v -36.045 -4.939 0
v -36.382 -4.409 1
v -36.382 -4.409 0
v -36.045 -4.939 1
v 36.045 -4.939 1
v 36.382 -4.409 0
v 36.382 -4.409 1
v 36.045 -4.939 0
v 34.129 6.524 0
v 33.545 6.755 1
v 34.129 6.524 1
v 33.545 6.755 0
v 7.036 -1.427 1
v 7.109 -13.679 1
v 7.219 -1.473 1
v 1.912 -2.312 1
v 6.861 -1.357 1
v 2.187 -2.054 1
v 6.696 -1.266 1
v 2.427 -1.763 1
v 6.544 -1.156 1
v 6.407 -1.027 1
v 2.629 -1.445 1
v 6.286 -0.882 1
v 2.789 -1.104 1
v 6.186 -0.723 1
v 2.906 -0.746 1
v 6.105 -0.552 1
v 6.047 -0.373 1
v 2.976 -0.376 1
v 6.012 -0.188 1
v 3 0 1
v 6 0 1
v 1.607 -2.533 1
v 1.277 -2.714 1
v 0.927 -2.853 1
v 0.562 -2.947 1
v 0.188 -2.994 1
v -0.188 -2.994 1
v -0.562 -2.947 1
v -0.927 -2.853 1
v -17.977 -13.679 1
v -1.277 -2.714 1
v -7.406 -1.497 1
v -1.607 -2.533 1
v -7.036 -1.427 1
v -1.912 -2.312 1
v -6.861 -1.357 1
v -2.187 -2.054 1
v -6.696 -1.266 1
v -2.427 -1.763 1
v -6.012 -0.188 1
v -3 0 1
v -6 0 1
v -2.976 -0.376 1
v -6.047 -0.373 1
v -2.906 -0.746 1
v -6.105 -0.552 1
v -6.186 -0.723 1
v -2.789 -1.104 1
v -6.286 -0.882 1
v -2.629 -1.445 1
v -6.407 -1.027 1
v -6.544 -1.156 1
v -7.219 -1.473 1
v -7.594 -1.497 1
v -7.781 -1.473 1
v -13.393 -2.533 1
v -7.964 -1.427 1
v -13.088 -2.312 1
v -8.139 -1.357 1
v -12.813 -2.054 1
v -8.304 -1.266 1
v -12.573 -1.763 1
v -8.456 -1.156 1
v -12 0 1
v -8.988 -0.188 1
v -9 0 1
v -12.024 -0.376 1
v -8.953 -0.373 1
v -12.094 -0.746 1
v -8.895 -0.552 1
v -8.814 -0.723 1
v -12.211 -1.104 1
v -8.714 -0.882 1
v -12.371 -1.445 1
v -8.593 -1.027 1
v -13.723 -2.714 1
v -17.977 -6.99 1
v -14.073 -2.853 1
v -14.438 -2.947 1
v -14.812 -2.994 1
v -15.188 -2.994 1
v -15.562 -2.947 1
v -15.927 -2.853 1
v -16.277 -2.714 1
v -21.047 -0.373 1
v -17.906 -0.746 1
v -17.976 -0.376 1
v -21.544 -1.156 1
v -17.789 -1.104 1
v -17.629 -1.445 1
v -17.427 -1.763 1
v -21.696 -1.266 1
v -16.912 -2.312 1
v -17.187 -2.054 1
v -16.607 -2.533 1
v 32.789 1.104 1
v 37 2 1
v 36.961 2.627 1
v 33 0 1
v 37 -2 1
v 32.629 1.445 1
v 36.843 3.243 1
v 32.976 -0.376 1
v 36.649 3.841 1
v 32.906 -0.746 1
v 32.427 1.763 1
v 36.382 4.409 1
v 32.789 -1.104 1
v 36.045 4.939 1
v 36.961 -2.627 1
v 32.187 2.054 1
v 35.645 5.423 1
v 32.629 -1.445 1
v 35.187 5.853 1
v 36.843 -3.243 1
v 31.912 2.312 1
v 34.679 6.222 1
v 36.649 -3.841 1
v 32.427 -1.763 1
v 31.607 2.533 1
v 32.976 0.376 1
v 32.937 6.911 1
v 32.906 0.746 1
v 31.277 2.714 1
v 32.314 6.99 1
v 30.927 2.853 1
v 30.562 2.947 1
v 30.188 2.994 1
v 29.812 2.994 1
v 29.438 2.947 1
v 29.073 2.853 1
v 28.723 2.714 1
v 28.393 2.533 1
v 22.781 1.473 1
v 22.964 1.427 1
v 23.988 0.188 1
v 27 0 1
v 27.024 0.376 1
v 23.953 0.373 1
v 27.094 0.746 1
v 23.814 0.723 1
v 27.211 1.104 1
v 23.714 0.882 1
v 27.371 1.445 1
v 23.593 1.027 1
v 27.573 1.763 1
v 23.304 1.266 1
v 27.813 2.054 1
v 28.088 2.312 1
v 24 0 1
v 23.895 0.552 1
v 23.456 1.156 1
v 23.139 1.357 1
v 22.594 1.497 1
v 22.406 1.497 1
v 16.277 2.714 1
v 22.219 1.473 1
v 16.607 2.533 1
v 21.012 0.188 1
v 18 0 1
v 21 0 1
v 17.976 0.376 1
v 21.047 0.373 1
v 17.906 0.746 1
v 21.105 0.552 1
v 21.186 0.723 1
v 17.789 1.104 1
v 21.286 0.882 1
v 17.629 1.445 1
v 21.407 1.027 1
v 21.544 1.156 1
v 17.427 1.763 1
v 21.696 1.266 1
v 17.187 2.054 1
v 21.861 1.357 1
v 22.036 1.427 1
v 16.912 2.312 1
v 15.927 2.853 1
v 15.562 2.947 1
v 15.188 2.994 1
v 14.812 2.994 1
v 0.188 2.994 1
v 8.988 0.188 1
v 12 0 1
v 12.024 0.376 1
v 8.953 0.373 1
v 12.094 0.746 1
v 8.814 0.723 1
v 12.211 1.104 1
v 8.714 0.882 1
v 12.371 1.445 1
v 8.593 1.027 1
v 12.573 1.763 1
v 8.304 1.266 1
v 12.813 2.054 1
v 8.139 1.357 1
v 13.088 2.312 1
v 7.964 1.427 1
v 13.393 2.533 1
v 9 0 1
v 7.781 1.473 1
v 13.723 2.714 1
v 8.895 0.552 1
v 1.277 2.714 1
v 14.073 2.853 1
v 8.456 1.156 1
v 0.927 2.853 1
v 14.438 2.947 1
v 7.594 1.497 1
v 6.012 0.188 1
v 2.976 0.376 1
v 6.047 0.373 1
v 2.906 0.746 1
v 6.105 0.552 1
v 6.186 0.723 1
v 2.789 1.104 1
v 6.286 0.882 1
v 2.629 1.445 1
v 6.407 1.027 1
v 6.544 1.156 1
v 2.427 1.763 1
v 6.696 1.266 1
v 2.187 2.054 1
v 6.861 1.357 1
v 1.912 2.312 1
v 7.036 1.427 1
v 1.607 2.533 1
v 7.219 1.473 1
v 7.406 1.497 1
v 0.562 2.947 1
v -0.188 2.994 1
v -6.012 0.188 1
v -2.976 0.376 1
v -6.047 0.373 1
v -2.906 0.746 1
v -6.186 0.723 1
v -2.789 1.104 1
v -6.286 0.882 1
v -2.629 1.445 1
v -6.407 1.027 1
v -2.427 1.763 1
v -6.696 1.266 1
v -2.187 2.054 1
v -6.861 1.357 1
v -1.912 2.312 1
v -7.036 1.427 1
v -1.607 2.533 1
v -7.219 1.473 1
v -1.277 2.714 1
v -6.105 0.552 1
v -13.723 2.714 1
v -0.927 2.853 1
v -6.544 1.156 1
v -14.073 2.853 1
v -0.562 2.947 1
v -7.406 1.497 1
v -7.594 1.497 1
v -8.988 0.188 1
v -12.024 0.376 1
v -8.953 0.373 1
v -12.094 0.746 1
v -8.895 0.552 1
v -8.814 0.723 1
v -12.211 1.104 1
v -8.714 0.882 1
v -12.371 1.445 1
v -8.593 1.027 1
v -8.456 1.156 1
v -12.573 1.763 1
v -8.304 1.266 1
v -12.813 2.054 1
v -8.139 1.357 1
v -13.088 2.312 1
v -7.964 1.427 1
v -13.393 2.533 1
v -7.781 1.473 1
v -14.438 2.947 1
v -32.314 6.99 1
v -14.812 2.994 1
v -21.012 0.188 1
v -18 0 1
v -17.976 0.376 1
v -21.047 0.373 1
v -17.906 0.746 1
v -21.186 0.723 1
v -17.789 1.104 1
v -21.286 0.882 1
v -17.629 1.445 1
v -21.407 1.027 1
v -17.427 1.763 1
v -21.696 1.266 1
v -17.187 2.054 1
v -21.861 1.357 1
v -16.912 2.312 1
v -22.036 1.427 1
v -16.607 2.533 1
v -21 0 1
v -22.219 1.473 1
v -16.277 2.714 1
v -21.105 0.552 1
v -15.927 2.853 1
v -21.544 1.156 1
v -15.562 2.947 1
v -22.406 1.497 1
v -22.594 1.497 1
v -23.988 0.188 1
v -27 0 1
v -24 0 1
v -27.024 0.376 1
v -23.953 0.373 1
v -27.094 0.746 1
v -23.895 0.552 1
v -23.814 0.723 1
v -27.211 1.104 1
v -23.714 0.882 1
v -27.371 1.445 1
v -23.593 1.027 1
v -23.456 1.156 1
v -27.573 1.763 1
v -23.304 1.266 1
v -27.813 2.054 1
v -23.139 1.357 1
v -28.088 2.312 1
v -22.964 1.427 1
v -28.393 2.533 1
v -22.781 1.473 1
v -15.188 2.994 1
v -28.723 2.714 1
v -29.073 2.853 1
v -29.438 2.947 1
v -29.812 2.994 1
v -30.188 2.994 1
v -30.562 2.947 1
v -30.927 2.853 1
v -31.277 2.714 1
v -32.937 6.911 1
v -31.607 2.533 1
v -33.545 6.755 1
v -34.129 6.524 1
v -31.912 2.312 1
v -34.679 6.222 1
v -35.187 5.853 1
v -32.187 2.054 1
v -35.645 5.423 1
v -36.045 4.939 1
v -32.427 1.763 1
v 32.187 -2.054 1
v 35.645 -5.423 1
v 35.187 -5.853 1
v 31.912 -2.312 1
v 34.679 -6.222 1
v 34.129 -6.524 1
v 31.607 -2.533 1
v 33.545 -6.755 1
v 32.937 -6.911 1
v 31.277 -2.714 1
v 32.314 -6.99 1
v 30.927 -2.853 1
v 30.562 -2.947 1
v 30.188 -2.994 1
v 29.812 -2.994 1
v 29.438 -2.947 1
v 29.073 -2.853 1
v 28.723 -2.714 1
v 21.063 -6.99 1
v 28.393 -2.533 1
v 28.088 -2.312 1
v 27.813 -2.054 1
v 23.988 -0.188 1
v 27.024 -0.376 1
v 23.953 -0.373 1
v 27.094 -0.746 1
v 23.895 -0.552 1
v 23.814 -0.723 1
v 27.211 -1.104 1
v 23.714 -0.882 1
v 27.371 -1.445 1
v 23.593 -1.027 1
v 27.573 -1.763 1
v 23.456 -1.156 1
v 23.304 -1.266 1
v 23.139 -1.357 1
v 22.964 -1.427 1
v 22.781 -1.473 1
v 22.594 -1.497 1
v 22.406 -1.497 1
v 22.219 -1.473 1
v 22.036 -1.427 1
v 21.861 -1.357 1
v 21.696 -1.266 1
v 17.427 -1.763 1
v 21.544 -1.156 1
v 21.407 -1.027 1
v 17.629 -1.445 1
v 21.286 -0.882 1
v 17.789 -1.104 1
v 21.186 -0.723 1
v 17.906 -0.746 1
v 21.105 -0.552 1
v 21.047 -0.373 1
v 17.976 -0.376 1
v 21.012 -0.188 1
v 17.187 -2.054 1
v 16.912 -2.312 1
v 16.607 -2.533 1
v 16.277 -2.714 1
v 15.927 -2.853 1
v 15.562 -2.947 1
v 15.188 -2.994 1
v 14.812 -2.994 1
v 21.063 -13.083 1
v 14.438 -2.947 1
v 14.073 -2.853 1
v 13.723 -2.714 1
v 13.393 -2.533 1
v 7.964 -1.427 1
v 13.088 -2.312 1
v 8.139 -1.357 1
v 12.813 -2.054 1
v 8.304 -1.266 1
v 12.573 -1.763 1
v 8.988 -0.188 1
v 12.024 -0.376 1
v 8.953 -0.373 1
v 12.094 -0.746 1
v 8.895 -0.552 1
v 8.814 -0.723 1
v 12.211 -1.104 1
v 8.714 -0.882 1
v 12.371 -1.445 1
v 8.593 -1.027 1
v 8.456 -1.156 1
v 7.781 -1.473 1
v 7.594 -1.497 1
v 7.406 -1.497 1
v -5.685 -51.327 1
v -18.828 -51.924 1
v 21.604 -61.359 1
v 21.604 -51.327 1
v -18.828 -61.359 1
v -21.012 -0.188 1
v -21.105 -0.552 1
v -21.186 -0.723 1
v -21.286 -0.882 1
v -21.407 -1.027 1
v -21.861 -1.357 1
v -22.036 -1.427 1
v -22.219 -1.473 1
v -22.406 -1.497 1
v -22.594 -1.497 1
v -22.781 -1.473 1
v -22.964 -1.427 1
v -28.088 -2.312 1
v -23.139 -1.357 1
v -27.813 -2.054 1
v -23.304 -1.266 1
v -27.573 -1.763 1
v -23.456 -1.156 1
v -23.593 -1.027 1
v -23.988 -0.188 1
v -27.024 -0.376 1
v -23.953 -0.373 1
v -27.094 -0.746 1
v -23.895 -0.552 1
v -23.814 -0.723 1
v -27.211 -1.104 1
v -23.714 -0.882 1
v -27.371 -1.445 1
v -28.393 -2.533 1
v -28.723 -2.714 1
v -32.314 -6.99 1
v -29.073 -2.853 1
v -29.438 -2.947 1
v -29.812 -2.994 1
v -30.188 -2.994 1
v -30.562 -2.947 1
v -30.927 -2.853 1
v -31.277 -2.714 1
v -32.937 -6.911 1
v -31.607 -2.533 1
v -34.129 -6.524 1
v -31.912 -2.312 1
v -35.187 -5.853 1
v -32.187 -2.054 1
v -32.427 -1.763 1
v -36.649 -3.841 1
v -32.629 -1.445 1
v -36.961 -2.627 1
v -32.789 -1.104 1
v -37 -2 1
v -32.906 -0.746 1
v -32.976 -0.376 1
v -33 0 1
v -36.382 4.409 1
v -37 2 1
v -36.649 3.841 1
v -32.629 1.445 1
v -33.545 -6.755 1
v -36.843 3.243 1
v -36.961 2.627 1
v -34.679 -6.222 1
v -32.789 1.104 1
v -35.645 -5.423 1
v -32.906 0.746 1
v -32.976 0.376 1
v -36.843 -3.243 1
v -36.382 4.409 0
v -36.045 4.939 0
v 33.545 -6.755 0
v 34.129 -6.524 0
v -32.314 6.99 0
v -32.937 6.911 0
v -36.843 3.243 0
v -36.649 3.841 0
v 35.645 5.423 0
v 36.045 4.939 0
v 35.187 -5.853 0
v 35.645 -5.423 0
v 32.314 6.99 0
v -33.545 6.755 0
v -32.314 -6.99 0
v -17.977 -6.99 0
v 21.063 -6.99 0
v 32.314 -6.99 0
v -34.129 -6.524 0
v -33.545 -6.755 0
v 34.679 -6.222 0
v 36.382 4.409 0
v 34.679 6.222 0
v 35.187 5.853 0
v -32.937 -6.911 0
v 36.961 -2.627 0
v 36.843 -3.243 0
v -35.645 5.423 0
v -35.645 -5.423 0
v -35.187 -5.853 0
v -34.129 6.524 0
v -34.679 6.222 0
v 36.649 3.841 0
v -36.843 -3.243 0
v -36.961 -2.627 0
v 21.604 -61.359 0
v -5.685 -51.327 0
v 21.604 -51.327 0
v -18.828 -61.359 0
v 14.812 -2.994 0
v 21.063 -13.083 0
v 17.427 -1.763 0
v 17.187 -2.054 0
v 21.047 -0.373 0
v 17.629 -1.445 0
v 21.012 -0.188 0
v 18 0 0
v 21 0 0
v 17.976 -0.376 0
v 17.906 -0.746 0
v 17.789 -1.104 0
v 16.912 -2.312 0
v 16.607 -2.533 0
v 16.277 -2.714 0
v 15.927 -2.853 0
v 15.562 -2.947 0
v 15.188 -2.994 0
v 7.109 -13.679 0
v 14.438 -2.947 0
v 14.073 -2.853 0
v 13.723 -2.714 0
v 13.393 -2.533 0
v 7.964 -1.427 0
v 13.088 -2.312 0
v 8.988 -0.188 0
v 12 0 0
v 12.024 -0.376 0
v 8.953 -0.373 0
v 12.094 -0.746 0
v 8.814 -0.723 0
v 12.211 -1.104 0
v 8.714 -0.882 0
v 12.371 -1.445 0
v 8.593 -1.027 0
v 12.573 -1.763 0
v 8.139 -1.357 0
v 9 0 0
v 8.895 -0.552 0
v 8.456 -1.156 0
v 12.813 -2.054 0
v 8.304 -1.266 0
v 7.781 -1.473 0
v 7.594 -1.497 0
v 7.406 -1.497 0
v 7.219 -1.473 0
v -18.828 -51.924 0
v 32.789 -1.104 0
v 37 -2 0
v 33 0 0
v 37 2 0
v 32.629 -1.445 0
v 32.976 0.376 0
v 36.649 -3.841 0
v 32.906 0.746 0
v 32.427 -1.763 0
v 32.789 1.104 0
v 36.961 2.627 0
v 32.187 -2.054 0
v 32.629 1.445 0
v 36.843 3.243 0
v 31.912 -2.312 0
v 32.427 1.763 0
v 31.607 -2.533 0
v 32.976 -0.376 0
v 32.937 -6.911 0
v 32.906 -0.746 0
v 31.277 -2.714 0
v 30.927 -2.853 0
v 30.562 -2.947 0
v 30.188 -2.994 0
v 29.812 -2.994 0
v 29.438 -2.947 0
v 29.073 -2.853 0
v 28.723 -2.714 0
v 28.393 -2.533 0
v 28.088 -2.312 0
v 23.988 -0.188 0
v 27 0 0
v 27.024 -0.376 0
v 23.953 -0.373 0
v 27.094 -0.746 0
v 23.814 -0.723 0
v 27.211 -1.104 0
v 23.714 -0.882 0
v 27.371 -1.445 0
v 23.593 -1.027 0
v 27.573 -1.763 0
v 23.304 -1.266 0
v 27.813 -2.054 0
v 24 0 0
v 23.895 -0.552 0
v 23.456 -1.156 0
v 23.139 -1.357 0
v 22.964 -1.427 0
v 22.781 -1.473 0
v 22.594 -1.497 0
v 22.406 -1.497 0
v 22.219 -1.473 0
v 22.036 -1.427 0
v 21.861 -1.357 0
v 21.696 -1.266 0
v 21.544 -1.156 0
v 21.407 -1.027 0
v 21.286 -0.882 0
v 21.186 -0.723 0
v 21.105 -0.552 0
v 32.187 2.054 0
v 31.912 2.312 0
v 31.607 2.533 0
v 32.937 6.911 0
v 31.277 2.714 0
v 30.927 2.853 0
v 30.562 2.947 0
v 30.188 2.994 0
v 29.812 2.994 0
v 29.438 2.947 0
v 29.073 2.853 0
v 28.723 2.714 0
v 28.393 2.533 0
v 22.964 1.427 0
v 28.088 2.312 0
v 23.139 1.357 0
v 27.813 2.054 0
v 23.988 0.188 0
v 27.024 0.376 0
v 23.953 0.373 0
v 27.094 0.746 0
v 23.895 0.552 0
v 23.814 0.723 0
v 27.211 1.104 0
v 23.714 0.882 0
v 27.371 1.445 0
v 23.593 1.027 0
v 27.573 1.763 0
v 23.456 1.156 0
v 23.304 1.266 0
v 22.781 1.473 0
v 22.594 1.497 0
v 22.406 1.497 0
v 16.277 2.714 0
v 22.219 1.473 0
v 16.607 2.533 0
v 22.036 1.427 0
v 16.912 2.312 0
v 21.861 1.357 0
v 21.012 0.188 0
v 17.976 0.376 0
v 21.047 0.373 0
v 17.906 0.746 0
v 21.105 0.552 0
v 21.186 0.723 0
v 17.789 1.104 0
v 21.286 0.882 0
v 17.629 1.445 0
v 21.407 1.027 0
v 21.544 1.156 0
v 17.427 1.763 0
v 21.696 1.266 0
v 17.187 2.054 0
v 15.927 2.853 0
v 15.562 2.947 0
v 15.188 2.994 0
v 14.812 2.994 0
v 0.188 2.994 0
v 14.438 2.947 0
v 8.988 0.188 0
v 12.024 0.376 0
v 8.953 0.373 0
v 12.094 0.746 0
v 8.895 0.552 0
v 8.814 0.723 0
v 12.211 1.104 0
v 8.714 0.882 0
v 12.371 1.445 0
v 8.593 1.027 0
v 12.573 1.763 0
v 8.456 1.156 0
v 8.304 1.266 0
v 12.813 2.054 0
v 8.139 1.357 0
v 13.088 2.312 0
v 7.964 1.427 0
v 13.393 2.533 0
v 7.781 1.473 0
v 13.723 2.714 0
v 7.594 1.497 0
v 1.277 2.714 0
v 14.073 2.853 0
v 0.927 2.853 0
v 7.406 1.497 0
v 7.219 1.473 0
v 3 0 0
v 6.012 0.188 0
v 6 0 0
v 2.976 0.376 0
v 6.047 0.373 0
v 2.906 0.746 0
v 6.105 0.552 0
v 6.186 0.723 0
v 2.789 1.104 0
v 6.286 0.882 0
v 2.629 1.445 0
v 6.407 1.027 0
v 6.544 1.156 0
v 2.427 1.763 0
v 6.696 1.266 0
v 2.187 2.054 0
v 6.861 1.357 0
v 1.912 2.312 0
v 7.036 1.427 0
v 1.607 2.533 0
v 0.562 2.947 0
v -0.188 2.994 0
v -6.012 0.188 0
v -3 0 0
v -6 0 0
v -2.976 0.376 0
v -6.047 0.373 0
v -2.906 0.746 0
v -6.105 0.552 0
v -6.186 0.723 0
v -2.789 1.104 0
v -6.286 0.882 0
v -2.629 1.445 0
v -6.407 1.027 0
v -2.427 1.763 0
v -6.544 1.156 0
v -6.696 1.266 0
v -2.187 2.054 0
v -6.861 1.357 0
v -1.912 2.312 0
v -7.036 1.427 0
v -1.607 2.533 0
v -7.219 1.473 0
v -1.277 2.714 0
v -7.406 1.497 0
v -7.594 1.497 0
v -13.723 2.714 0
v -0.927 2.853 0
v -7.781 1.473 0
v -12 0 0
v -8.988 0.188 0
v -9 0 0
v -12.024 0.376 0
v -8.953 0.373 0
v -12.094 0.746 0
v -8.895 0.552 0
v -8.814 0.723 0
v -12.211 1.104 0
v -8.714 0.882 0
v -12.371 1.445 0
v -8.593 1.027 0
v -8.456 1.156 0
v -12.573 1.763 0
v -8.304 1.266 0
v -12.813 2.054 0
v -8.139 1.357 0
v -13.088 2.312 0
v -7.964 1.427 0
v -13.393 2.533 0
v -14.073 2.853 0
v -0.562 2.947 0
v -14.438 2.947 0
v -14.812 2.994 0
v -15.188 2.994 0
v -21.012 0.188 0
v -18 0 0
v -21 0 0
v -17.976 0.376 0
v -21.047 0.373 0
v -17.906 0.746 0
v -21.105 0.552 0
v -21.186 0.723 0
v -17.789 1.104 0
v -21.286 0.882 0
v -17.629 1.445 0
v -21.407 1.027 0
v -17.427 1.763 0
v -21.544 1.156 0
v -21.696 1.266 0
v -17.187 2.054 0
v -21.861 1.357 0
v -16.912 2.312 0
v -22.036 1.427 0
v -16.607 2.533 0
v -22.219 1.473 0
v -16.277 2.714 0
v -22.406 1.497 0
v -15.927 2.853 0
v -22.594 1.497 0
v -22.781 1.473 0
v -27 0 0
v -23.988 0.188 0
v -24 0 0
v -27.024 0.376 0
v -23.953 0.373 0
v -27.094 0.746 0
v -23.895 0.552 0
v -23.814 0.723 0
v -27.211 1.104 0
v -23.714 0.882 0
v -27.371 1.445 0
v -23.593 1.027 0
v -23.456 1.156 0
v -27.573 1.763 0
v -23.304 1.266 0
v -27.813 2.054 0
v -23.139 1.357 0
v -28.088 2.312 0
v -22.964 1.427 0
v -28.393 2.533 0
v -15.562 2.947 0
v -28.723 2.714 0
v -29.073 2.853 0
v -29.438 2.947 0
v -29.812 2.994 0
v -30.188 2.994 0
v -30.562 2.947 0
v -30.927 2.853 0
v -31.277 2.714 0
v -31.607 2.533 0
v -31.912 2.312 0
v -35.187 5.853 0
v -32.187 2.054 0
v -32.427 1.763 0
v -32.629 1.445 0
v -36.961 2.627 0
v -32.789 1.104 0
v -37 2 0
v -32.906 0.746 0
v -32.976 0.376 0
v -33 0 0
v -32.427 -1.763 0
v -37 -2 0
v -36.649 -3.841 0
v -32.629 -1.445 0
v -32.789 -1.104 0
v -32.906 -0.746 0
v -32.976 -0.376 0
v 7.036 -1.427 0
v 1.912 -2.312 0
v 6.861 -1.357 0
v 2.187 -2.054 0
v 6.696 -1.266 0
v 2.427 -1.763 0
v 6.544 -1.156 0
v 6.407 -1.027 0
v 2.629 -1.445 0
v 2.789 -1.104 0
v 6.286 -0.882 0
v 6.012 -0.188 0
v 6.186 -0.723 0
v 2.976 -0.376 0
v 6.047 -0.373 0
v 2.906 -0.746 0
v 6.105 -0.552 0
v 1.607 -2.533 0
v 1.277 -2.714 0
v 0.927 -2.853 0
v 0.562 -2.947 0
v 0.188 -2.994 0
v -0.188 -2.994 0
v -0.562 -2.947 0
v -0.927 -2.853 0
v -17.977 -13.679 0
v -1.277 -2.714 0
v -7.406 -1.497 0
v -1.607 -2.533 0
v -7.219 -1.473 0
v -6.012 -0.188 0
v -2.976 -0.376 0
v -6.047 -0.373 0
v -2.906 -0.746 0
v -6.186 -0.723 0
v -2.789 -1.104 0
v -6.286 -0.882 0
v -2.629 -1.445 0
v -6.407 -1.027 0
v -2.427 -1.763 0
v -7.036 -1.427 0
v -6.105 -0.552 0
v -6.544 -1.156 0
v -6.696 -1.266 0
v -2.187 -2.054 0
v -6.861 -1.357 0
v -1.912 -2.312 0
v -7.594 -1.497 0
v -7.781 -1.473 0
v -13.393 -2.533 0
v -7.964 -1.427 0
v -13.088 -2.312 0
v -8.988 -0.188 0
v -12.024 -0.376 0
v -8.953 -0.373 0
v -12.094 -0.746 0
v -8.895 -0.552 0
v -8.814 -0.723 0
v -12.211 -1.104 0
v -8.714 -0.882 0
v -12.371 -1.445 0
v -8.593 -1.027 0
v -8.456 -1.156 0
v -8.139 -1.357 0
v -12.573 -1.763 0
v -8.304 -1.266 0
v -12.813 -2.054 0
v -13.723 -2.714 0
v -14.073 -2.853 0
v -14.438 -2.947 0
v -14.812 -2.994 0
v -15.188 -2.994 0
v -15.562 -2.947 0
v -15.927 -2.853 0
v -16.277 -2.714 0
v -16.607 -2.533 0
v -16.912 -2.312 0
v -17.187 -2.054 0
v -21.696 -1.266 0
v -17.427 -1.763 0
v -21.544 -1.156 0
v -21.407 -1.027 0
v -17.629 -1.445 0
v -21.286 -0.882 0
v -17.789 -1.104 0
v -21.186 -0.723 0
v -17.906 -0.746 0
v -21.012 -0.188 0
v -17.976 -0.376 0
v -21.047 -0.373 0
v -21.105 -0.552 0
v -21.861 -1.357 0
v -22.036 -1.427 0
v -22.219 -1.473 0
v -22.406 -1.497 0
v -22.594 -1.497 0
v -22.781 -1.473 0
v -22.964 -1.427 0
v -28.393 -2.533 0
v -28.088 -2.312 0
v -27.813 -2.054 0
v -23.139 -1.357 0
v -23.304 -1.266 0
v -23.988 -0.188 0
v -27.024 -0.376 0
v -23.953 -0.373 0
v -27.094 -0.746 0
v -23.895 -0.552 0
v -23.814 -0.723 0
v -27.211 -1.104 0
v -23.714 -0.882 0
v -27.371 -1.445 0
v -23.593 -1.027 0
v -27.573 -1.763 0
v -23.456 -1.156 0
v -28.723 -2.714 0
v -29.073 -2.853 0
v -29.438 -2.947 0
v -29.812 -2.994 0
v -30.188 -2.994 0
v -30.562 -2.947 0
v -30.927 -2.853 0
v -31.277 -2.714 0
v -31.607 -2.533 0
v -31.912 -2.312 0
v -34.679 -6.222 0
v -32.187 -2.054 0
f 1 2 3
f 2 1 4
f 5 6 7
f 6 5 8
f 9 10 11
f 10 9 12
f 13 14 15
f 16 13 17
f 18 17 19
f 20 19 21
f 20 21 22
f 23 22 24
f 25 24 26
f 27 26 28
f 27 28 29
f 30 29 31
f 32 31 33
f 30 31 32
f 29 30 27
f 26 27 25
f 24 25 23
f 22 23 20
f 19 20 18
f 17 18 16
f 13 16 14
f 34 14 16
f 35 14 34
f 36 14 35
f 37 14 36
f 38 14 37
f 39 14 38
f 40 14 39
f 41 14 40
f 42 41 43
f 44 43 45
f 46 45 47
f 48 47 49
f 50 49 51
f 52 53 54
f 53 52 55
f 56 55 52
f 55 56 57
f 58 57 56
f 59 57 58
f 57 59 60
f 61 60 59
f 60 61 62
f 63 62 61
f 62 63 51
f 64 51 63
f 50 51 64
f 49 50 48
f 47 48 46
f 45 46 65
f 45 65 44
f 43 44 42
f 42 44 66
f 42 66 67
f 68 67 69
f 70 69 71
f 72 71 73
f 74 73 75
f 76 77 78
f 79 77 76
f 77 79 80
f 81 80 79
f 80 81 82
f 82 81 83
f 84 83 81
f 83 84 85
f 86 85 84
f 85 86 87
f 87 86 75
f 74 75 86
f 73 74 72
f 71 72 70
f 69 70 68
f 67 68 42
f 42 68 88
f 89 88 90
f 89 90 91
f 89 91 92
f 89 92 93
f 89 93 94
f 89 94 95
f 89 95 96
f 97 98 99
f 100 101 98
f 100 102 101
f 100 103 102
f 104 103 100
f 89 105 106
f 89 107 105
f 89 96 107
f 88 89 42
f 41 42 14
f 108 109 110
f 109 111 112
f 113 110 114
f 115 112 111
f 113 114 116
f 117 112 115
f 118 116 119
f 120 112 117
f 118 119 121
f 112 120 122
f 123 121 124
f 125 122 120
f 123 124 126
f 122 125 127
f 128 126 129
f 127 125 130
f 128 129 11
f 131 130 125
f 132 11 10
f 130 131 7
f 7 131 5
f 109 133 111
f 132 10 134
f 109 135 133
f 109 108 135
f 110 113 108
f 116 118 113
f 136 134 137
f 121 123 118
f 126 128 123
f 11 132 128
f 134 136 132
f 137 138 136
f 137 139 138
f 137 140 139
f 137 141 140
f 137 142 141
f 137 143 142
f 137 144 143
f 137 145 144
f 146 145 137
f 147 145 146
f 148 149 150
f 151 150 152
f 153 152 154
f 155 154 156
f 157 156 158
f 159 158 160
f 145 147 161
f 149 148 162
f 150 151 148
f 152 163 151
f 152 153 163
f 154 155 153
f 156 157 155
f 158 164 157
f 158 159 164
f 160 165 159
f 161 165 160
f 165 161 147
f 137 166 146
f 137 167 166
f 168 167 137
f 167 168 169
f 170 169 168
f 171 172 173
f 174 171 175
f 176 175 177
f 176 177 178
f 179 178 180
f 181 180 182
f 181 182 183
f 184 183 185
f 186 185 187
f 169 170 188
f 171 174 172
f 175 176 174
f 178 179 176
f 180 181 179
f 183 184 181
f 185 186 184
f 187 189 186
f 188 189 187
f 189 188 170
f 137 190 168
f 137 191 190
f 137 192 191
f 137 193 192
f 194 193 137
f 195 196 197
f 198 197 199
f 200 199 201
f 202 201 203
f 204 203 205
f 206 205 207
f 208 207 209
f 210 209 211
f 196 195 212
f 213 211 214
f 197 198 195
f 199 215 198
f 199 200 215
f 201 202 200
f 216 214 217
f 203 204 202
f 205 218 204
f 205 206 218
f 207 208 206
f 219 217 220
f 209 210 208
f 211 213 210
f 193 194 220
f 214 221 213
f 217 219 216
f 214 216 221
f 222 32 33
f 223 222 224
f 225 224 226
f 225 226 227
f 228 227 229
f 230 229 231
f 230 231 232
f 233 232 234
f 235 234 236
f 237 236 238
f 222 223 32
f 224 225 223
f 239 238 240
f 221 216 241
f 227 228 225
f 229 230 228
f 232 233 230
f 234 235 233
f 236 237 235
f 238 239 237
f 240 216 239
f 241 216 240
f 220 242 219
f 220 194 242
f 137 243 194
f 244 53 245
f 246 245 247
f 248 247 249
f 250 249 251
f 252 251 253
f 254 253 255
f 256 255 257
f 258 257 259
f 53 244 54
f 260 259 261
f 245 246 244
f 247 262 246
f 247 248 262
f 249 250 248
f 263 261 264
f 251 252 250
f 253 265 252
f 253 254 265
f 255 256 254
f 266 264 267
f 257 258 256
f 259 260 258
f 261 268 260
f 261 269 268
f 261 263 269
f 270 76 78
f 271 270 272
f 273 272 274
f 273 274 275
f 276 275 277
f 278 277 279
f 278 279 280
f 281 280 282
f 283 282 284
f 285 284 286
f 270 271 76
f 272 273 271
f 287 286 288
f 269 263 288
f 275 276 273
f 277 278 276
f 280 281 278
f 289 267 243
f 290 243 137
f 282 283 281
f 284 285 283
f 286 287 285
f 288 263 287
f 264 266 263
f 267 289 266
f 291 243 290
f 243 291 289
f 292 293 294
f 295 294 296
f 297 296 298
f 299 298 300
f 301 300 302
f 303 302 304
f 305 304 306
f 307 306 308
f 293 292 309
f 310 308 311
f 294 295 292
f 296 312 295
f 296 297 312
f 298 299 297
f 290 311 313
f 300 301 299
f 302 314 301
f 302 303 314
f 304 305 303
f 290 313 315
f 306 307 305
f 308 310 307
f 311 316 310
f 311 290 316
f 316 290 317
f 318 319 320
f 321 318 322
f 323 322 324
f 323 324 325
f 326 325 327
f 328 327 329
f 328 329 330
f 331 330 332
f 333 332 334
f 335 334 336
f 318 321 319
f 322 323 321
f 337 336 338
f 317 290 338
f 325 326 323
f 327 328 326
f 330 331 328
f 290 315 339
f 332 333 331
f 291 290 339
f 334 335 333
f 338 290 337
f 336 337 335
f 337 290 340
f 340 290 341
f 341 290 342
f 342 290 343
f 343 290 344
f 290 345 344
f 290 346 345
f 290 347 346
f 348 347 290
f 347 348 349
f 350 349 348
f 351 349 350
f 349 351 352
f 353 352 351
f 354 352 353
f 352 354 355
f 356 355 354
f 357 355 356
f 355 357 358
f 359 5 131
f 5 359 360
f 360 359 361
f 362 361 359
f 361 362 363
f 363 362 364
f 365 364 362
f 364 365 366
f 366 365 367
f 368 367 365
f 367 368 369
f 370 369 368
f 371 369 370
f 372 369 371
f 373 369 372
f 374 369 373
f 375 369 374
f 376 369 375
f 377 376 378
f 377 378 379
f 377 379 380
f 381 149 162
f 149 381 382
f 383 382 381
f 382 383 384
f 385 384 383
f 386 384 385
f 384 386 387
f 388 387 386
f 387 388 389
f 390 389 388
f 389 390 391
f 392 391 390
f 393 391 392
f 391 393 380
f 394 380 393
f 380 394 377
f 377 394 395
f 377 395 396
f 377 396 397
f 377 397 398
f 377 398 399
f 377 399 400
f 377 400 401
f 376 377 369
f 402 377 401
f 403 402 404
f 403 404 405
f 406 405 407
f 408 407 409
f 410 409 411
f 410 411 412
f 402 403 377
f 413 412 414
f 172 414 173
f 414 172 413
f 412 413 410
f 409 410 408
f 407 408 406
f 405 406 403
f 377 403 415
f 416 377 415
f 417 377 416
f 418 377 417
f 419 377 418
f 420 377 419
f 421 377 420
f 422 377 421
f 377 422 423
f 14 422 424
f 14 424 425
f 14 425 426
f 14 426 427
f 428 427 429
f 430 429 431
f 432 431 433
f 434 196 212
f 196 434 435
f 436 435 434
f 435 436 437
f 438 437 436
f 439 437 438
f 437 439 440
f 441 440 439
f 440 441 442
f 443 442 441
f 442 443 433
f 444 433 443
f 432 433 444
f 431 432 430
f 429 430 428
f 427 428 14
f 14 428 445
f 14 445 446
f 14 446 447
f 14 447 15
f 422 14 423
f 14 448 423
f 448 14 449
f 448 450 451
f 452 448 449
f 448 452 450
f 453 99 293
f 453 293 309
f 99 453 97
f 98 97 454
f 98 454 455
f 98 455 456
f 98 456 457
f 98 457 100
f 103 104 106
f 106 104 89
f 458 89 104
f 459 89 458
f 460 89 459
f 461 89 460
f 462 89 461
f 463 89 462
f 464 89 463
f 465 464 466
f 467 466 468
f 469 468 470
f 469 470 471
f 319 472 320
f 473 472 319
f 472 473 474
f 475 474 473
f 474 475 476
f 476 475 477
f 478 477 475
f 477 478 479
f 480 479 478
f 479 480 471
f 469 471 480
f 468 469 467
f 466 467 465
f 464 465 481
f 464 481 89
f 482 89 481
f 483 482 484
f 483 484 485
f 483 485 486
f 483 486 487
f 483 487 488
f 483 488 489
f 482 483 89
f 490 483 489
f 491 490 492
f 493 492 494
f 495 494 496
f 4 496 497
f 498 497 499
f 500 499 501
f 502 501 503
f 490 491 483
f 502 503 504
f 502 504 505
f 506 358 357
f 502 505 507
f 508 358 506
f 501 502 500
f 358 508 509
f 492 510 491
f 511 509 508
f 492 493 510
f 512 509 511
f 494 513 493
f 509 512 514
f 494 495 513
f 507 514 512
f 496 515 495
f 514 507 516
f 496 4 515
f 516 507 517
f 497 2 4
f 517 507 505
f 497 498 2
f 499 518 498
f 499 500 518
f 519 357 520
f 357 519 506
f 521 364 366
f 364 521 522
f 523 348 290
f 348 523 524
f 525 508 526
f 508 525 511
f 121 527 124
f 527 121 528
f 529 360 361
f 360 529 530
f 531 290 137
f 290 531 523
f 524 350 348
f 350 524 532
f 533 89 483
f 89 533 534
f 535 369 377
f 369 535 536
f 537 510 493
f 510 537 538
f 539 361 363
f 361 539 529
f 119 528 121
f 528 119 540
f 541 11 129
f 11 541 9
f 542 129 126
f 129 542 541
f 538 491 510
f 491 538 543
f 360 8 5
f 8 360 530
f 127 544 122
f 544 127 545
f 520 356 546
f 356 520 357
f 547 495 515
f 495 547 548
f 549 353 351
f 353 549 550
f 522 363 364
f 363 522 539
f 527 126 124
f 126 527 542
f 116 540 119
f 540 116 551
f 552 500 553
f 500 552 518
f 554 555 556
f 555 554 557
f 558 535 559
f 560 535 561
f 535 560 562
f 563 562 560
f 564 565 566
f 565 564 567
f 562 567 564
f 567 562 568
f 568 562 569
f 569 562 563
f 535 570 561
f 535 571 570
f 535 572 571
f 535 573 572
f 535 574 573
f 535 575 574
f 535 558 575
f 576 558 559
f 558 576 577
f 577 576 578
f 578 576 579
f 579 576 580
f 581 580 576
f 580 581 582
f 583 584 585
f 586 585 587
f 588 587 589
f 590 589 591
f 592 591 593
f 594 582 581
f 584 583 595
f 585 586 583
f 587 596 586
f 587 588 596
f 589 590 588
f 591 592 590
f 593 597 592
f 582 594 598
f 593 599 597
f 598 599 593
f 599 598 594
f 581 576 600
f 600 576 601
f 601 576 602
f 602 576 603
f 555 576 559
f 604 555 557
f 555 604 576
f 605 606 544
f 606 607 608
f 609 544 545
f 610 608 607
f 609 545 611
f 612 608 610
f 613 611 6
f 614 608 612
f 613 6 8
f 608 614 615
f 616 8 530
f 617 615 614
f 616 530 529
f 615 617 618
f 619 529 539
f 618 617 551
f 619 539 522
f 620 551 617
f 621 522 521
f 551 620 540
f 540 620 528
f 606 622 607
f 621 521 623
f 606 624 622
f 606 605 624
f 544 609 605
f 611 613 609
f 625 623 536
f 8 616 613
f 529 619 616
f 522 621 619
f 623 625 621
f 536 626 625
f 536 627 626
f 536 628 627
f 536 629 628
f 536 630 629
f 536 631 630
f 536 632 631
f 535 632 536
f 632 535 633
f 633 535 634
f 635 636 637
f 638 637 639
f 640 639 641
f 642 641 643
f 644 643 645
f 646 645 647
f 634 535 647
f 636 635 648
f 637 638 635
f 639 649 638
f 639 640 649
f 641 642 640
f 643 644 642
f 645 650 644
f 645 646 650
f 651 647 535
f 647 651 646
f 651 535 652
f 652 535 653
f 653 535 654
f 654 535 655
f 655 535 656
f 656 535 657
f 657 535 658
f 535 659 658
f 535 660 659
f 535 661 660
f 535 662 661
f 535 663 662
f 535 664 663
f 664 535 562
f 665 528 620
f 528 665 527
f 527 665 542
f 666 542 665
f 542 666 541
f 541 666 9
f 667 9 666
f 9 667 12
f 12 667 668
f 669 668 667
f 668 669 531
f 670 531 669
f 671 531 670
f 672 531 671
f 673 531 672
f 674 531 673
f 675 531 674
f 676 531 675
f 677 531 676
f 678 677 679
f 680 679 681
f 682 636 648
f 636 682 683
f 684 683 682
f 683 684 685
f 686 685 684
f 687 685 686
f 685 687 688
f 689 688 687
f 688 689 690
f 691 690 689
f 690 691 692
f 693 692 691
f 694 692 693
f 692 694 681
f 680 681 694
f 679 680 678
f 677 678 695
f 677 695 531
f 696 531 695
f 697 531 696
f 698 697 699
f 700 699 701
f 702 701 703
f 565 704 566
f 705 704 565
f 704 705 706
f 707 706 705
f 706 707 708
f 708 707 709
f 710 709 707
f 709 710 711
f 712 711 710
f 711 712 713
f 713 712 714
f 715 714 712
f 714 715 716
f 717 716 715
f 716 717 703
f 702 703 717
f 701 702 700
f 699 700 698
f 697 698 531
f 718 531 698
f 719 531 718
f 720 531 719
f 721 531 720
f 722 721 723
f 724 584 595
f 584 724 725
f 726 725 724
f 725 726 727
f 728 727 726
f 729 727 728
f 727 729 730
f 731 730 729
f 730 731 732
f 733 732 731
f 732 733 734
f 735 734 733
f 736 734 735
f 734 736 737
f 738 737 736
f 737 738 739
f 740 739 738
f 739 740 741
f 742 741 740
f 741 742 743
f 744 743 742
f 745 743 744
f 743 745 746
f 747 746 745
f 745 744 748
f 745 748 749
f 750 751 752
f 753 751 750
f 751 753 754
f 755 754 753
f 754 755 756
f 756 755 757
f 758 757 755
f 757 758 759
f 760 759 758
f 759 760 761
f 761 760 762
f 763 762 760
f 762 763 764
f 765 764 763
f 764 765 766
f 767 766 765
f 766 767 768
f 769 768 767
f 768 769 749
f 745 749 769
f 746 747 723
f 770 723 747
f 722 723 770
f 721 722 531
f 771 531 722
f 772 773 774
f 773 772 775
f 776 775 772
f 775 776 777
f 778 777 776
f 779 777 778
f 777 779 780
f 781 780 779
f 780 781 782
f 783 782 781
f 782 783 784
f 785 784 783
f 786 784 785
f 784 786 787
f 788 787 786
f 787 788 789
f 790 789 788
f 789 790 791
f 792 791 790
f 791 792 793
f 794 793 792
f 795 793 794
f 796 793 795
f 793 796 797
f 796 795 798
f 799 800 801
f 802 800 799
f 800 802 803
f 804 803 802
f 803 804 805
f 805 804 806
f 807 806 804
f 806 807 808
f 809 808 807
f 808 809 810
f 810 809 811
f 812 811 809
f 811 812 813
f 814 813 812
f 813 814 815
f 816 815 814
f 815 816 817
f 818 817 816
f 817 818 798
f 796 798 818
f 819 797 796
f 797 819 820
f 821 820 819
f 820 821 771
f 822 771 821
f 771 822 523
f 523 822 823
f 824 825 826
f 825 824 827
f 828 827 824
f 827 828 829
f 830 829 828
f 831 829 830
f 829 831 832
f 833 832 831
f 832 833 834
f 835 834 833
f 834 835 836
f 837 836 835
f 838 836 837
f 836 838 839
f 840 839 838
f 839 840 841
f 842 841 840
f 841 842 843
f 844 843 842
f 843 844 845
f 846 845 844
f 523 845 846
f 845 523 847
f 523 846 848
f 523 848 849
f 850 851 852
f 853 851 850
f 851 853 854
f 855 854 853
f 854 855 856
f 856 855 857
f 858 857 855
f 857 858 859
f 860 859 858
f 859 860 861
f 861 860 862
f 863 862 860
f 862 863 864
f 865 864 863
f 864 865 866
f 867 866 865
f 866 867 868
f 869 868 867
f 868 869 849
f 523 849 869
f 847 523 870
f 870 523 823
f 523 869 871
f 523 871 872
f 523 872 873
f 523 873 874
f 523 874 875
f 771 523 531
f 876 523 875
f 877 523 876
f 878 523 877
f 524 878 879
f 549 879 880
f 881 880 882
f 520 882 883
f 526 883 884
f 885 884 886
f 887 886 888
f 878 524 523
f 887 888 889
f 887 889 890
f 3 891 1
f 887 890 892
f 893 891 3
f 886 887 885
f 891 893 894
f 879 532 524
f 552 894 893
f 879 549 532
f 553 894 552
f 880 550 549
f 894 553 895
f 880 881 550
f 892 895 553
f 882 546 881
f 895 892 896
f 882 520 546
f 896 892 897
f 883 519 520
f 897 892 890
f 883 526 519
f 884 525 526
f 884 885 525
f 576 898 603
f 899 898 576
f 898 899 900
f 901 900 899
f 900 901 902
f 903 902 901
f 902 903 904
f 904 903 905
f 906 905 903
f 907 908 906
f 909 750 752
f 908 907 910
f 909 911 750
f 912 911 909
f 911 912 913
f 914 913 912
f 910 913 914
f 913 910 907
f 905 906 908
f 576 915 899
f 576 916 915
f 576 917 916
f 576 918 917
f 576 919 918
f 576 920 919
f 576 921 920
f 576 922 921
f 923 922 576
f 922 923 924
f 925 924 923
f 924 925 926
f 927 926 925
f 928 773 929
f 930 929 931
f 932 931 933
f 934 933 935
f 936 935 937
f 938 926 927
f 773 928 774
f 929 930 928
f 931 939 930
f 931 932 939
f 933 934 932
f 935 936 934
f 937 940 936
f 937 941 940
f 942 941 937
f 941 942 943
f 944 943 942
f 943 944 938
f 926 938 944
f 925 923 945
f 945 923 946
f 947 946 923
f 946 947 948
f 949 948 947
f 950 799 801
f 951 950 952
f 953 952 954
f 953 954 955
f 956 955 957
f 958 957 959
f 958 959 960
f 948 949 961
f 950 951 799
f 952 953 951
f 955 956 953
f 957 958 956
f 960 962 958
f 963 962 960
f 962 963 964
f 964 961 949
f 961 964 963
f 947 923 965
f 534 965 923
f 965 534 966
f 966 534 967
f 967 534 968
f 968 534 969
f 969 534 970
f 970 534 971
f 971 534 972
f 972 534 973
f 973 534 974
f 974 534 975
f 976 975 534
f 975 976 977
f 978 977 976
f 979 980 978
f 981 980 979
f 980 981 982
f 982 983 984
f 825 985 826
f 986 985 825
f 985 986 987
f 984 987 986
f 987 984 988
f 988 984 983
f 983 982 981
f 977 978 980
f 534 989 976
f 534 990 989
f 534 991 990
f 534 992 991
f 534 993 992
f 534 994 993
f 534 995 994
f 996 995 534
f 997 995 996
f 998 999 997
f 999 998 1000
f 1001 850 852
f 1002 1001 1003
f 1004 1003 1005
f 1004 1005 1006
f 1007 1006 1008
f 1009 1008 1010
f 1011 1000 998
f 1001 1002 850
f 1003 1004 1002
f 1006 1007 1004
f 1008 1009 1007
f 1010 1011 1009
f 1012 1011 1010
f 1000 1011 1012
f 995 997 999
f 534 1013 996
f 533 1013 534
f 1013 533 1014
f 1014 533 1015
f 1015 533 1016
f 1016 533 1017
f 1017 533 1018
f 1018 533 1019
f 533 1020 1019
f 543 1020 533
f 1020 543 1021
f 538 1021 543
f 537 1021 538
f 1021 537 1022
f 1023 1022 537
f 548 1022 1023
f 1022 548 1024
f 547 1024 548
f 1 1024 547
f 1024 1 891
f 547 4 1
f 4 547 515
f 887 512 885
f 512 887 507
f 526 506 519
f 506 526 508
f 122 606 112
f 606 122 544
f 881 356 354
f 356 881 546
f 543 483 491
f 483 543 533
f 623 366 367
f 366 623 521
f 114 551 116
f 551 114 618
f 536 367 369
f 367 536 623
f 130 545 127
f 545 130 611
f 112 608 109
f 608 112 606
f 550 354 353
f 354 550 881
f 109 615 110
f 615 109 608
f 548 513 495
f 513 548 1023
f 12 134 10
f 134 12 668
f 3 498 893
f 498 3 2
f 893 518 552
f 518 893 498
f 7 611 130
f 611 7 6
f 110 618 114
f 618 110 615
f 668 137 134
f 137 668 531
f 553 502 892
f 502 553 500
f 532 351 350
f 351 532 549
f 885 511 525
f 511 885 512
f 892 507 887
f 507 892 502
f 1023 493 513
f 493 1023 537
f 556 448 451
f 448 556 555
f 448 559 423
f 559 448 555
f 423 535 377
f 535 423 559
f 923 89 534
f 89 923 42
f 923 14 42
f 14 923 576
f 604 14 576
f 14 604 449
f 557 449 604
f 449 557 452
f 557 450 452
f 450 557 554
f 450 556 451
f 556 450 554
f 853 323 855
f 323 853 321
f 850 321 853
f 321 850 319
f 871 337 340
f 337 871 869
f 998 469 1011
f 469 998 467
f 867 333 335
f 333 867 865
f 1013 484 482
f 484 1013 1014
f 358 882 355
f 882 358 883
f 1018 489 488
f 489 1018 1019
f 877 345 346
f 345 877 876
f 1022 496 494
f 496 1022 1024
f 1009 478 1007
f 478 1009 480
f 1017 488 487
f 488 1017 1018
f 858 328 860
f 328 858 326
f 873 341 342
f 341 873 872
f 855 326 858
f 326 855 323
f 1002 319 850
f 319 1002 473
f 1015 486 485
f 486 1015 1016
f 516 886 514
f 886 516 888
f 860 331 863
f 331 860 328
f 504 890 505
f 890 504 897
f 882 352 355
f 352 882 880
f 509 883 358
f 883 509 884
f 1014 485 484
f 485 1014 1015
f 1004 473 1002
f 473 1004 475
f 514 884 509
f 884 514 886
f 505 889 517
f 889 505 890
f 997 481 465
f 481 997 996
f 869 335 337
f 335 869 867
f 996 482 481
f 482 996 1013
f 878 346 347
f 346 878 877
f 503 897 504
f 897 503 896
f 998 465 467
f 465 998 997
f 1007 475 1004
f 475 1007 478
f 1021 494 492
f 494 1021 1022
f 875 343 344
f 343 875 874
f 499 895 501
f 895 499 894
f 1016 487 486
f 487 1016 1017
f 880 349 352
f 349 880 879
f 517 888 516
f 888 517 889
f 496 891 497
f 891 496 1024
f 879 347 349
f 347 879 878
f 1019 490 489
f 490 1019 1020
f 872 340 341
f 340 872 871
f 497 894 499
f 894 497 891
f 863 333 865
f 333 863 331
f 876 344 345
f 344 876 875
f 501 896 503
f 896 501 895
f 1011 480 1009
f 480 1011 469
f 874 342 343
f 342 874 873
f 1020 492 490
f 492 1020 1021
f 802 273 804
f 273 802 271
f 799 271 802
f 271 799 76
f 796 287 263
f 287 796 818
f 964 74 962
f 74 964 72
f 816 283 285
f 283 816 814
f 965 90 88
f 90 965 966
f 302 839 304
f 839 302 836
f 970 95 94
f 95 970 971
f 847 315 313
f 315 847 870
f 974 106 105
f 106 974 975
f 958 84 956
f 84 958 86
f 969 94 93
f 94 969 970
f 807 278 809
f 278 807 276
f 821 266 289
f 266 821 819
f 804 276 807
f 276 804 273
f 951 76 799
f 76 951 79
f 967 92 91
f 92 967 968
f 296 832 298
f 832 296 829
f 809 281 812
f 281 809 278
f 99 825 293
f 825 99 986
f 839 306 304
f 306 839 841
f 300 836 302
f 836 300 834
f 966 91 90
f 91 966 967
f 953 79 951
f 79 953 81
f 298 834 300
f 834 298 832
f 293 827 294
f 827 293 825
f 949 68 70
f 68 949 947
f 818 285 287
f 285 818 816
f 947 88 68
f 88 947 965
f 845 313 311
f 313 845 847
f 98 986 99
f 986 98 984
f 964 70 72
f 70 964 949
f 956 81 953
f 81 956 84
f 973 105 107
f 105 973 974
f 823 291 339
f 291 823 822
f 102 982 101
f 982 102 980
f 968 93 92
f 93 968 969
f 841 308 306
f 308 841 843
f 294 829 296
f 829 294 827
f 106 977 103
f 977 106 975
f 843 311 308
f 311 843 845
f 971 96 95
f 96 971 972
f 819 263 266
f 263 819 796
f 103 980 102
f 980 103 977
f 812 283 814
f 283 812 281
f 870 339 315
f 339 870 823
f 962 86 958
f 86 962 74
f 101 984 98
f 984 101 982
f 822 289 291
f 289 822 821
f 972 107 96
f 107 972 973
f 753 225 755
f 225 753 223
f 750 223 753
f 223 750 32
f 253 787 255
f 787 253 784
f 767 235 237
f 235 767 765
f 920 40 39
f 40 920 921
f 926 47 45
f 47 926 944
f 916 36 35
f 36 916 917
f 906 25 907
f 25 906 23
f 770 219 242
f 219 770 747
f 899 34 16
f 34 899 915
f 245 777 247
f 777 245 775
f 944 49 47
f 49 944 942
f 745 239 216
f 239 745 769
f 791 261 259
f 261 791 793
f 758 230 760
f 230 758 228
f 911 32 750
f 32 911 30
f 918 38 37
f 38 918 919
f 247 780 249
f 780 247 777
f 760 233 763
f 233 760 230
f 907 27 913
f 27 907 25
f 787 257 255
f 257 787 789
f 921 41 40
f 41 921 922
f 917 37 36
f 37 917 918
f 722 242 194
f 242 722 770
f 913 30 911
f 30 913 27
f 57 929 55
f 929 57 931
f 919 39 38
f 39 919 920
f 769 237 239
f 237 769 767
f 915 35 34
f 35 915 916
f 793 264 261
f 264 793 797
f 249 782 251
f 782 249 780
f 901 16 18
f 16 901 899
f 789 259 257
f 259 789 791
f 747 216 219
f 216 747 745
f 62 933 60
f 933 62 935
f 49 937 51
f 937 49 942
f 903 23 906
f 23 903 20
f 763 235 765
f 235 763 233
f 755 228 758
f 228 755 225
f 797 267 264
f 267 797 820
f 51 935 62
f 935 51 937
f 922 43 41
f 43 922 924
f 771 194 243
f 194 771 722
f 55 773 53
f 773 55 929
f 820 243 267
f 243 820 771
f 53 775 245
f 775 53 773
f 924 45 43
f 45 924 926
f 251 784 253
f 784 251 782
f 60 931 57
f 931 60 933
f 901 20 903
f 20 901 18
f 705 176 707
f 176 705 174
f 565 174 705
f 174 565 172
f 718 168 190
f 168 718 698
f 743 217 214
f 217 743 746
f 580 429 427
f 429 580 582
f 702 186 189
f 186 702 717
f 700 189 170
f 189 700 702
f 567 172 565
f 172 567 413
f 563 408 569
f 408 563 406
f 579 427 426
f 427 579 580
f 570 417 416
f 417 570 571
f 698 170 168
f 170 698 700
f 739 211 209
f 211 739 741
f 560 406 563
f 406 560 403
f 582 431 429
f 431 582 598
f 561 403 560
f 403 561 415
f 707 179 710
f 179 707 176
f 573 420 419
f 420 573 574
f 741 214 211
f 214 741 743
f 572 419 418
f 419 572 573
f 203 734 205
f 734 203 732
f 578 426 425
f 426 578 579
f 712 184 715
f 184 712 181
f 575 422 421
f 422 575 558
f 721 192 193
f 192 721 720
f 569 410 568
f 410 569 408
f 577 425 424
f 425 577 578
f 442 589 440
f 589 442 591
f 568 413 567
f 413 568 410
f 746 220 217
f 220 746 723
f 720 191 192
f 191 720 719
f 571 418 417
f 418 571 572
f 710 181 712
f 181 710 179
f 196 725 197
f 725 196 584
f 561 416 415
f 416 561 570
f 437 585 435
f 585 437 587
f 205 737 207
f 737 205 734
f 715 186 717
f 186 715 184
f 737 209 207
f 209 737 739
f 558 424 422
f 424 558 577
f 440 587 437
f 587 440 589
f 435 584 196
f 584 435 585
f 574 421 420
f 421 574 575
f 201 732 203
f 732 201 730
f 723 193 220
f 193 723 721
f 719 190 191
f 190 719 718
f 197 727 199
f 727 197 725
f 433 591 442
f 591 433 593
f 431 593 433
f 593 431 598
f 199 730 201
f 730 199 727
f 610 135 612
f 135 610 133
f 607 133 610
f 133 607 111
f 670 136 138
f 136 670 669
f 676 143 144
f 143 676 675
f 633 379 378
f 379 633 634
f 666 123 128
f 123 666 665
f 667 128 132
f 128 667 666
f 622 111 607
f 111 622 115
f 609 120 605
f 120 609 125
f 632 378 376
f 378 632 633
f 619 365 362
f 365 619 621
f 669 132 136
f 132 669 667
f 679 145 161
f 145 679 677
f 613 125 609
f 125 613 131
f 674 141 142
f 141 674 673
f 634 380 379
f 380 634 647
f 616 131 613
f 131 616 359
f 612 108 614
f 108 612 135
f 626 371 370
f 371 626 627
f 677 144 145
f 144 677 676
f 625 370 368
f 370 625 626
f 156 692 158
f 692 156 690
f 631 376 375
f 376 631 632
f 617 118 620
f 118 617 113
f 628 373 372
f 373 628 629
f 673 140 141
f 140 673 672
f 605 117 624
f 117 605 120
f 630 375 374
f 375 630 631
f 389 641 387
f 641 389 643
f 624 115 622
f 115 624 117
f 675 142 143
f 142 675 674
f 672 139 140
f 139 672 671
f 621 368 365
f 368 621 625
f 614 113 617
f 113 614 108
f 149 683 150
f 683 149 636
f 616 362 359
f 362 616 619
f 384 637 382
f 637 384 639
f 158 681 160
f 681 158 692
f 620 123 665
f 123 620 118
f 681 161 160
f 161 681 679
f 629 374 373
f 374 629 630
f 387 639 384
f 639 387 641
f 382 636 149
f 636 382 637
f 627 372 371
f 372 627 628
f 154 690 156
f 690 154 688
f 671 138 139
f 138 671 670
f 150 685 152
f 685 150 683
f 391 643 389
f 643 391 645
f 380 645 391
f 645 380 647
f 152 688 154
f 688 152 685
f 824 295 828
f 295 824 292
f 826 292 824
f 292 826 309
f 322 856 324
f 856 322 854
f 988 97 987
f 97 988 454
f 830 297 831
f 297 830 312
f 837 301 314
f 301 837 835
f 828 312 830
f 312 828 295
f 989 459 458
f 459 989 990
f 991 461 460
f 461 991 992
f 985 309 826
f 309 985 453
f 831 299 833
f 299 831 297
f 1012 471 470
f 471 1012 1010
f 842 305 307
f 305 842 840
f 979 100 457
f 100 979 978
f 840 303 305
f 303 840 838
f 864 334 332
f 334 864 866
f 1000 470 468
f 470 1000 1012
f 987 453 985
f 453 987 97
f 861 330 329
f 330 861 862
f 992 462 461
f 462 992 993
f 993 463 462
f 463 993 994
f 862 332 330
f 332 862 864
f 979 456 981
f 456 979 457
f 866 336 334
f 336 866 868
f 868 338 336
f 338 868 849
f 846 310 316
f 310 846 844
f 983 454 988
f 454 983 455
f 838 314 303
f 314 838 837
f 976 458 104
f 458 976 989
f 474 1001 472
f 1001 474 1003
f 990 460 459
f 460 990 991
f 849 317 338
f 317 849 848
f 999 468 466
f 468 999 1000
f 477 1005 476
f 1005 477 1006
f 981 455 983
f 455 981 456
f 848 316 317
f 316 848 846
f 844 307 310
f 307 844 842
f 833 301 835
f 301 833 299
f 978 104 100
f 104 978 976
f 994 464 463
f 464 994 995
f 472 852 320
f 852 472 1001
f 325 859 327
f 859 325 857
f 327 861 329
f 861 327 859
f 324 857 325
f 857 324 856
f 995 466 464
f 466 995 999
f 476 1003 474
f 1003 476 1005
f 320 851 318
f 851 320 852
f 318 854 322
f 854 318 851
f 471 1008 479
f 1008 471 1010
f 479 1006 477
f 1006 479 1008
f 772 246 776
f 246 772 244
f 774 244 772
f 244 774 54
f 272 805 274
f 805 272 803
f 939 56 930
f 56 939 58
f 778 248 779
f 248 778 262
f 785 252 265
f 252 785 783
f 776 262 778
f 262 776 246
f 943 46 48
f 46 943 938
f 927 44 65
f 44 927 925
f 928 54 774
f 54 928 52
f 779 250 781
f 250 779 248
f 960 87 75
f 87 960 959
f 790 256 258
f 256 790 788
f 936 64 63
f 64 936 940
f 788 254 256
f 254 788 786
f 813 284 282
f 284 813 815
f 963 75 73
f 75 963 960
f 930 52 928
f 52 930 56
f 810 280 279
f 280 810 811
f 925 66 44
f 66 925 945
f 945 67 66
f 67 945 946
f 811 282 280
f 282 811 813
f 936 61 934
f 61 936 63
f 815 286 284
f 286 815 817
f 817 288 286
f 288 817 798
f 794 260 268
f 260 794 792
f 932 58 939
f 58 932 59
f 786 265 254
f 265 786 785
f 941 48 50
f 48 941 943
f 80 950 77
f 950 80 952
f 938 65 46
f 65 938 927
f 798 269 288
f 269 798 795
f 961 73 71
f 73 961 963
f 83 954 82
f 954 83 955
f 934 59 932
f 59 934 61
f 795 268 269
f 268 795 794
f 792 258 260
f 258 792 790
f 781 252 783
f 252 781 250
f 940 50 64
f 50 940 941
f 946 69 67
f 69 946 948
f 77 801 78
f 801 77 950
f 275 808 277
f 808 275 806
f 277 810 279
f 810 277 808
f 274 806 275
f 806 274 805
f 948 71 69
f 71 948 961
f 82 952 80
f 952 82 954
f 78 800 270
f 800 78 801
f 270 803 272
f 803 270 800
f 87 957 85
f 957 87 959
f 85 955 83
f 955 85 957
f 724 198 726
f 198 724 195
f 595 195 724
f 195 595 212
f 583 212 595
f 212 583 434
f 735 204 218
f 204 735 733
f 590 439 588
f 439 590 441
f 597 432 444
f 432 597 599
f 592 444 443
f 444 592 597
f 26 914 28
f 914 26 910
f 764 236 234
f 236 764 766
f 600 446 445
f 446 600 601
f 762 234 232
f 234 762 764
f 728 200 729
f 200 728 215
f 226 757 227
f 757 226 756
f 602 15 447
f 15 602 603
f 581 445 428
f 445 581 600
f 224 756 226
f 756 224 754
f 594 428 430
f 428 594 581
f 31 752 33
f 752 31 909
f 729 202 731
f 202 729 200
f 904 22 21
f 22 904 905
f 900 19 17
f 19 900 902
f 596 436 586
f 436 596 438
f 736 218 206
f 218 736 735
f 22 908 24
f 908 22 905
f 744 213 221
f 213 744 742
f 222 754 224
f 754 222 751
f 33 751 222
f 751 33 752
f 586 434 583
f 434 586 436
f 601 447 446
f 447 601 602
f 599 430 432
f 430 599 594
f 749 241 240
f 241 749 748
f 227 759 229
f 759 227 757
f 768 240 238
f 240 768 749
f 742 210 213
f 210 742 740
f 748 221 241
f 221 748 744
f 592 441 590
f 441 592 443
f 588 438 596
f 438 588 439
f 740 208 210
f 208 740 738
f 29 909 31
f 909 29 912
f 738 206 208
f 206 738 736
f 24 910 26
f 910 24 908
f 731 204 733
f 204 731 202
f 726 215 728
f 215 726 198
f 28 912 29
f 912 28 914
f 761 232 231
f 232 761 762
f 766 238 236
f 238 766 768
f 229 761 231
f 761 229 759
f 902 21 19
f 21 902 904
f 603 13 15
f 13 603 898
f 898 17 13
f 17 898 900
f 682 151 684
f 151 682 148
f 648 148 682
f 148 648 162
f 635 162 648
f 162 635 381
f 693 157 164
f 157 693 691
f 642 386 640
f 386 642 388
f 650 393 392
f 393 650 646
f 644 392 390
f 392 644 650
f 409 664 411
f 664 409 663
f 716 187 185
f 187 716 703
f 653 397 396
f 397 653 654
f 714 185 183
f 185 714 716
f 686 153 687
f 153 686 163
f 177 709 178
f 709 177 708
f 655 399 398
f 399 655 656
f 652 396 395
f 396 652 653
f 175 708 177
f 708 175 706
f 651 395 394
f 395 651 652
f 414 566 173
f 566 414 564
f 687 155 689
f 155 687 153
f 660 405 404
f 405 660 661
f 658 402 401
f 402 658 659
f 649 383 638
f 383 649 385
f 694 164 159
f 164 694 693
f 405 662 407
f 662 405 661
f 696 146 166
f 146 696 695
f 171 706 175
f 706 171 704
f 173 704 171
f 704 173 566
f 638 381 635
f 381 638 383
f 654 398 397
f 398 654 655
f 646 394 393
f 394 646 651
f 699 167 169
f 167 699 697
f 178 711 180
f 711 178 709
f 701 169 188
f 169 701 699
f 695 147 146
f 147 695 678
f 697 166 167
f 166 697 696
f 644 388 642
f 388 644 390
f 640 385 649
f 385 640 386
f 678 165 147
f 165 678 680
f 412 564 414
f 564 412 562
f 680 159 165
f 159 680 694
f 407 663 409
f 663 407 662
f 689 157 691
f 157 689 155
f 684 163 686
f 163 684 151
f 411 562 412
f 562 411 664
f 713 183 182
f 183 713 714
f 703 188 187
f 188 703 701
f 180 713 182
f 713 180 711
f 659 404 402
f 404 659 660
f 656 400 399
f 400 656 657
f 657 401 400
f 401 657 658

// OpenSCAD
$fn = 50;


difference() {
	union() {
		*color(alpha = 1.0000000000, c = "gray") {
			translate(v = [0, 14, 0]) {
				linear_extrude(height = 1) {
					text(font = "Arial:style=Bold", halign = "center", size = 4.5000000000, text = "COMMENT description oobb_plate_shape_p_type_1_depth_5_width_1_thickness_z_extra_oobb_size", valign = "center");
				}
			}
		}
		hull() {
			translate(v = [-32.0000000000, 2.0000000000, 0]) {
				cylinder(h = 1, r = 5);
			}
			translate(v = [32.0000000000, 2.0000000000, 0]) {
				cylinder(h = 1, r = 5);
			}
			translate(v = [-32.0000000000, -2.0000000000, 0]) {
				cylinder(h = 1, r = 5);
			}
			translate(v = [32.0000000000, -2.0000000000, 0]) {
				cylinder(h = 1, r = 5);
			}
		}
		translate(v = [0, -5, 0]) {
			linear_extrude(height = 1) {
				text(font = "DejaVu Sans Mono:style=Bold", halign = "center", size = 57.0000000000, text = "Z", valign = "top");
			}
		}
	}
	union() {
		*color(alpha = 1.0000000000, c = "gray") {
			translate(v = [0, 14, 0]) {
				linear_extrude(height = 1) {
					text(font = "Arial:style=Bold", halign = "center", size = 4.5000000000, text = "COMMENT description oobb_holes_shape_n_type_5_width_1_thickness_z_extra_oobb_size_1_height_'all'_holes_true_both_holes", valign = "center");
				}
			}
		}
		translate(v = [-30.0000000000, 0.0000000000, 0]) {
			translate(v = [0, 0, -50]) {
				cylinder(h = 100, r = 3.0000000000);
			}
		}
		translate(v = [-15.0000000000, 0.0000000000, 0]) {
			translate(v = [0, 0, -50]) {
				cylinder(h = 100, r = 3.0000000000);
			}
		}
		translate(v = [0, 0, -50]) {
			cylinder(h = 100, r = 3.0000000000);
		}
		translate(v = [15.0000000000, 0.0000000000, 0]) {
			translate(v = [0, 0, -50]) {
				cylinder(h = 100, r = 3.0000000000);
			}
		}
		translate(v = [30.0000000000, 0.0000000000, 0]) {
			translate(v = [0, 0, -50]) {
				cylinder(h = 100, r = 3.0000000000);
			}
		}
		translate(v = [-30.0000000000, 0.0000000000, 0]) {
			translate(v = [0, 0, -50]) {
				cylinder(h = 100, r = 1.5000000000);
			}
		}
		translate(v = [-22.5000000000, 0.0000000000, 0]) {
			translate(v = [0, 0, -50]) {
				cylinder(h = 100, r = 1.5000000000);
			}
		}
		translate(v = [-15.0000000000, 0.0000000000, 0]) {
			translate(v = [0, 0, -50]) {
				cylinder(h = 100, r = 1.5000000000);
			}
		}
		translate(v = [-7.5000000000, 0.0000000000, 0]) {
			translate(v = [0, 0, -50]) {
				cylinder(h = 100, r = 1.5000000000);
			}
		}
		translate(v = [0, 0, -50]) {
			cylinder(h = 100, r = 1.5000000000);
		}
		translate(v = [7.5000000000, 0.0000000000, 0]) {
			translate(v = [0, 0, -50]) {
				cylinder(h = 100, r = 1.5000000000);
			}
		}
		translate(v = [15.0000000000, 0.0000000000, 0]) {
			translate(v = [0, 0, -50]) {
				cylinder(h = 100, r = 1.5000000000);
			}
		}
		translate(v = [22.5000000000, 0.0000000000, 0]) {
			translate(v = [0, 0, -50]) {
				cylinder(h = 100, r = 1.5000000000);
			}
		}
		translate(v = [30.0000000000, 0.0000000000, 0]) {
			translate(v = [0, 0, -50]) {
				cylinder(h = 100, r = 1.5000000000);
			}
		}
	}
}
